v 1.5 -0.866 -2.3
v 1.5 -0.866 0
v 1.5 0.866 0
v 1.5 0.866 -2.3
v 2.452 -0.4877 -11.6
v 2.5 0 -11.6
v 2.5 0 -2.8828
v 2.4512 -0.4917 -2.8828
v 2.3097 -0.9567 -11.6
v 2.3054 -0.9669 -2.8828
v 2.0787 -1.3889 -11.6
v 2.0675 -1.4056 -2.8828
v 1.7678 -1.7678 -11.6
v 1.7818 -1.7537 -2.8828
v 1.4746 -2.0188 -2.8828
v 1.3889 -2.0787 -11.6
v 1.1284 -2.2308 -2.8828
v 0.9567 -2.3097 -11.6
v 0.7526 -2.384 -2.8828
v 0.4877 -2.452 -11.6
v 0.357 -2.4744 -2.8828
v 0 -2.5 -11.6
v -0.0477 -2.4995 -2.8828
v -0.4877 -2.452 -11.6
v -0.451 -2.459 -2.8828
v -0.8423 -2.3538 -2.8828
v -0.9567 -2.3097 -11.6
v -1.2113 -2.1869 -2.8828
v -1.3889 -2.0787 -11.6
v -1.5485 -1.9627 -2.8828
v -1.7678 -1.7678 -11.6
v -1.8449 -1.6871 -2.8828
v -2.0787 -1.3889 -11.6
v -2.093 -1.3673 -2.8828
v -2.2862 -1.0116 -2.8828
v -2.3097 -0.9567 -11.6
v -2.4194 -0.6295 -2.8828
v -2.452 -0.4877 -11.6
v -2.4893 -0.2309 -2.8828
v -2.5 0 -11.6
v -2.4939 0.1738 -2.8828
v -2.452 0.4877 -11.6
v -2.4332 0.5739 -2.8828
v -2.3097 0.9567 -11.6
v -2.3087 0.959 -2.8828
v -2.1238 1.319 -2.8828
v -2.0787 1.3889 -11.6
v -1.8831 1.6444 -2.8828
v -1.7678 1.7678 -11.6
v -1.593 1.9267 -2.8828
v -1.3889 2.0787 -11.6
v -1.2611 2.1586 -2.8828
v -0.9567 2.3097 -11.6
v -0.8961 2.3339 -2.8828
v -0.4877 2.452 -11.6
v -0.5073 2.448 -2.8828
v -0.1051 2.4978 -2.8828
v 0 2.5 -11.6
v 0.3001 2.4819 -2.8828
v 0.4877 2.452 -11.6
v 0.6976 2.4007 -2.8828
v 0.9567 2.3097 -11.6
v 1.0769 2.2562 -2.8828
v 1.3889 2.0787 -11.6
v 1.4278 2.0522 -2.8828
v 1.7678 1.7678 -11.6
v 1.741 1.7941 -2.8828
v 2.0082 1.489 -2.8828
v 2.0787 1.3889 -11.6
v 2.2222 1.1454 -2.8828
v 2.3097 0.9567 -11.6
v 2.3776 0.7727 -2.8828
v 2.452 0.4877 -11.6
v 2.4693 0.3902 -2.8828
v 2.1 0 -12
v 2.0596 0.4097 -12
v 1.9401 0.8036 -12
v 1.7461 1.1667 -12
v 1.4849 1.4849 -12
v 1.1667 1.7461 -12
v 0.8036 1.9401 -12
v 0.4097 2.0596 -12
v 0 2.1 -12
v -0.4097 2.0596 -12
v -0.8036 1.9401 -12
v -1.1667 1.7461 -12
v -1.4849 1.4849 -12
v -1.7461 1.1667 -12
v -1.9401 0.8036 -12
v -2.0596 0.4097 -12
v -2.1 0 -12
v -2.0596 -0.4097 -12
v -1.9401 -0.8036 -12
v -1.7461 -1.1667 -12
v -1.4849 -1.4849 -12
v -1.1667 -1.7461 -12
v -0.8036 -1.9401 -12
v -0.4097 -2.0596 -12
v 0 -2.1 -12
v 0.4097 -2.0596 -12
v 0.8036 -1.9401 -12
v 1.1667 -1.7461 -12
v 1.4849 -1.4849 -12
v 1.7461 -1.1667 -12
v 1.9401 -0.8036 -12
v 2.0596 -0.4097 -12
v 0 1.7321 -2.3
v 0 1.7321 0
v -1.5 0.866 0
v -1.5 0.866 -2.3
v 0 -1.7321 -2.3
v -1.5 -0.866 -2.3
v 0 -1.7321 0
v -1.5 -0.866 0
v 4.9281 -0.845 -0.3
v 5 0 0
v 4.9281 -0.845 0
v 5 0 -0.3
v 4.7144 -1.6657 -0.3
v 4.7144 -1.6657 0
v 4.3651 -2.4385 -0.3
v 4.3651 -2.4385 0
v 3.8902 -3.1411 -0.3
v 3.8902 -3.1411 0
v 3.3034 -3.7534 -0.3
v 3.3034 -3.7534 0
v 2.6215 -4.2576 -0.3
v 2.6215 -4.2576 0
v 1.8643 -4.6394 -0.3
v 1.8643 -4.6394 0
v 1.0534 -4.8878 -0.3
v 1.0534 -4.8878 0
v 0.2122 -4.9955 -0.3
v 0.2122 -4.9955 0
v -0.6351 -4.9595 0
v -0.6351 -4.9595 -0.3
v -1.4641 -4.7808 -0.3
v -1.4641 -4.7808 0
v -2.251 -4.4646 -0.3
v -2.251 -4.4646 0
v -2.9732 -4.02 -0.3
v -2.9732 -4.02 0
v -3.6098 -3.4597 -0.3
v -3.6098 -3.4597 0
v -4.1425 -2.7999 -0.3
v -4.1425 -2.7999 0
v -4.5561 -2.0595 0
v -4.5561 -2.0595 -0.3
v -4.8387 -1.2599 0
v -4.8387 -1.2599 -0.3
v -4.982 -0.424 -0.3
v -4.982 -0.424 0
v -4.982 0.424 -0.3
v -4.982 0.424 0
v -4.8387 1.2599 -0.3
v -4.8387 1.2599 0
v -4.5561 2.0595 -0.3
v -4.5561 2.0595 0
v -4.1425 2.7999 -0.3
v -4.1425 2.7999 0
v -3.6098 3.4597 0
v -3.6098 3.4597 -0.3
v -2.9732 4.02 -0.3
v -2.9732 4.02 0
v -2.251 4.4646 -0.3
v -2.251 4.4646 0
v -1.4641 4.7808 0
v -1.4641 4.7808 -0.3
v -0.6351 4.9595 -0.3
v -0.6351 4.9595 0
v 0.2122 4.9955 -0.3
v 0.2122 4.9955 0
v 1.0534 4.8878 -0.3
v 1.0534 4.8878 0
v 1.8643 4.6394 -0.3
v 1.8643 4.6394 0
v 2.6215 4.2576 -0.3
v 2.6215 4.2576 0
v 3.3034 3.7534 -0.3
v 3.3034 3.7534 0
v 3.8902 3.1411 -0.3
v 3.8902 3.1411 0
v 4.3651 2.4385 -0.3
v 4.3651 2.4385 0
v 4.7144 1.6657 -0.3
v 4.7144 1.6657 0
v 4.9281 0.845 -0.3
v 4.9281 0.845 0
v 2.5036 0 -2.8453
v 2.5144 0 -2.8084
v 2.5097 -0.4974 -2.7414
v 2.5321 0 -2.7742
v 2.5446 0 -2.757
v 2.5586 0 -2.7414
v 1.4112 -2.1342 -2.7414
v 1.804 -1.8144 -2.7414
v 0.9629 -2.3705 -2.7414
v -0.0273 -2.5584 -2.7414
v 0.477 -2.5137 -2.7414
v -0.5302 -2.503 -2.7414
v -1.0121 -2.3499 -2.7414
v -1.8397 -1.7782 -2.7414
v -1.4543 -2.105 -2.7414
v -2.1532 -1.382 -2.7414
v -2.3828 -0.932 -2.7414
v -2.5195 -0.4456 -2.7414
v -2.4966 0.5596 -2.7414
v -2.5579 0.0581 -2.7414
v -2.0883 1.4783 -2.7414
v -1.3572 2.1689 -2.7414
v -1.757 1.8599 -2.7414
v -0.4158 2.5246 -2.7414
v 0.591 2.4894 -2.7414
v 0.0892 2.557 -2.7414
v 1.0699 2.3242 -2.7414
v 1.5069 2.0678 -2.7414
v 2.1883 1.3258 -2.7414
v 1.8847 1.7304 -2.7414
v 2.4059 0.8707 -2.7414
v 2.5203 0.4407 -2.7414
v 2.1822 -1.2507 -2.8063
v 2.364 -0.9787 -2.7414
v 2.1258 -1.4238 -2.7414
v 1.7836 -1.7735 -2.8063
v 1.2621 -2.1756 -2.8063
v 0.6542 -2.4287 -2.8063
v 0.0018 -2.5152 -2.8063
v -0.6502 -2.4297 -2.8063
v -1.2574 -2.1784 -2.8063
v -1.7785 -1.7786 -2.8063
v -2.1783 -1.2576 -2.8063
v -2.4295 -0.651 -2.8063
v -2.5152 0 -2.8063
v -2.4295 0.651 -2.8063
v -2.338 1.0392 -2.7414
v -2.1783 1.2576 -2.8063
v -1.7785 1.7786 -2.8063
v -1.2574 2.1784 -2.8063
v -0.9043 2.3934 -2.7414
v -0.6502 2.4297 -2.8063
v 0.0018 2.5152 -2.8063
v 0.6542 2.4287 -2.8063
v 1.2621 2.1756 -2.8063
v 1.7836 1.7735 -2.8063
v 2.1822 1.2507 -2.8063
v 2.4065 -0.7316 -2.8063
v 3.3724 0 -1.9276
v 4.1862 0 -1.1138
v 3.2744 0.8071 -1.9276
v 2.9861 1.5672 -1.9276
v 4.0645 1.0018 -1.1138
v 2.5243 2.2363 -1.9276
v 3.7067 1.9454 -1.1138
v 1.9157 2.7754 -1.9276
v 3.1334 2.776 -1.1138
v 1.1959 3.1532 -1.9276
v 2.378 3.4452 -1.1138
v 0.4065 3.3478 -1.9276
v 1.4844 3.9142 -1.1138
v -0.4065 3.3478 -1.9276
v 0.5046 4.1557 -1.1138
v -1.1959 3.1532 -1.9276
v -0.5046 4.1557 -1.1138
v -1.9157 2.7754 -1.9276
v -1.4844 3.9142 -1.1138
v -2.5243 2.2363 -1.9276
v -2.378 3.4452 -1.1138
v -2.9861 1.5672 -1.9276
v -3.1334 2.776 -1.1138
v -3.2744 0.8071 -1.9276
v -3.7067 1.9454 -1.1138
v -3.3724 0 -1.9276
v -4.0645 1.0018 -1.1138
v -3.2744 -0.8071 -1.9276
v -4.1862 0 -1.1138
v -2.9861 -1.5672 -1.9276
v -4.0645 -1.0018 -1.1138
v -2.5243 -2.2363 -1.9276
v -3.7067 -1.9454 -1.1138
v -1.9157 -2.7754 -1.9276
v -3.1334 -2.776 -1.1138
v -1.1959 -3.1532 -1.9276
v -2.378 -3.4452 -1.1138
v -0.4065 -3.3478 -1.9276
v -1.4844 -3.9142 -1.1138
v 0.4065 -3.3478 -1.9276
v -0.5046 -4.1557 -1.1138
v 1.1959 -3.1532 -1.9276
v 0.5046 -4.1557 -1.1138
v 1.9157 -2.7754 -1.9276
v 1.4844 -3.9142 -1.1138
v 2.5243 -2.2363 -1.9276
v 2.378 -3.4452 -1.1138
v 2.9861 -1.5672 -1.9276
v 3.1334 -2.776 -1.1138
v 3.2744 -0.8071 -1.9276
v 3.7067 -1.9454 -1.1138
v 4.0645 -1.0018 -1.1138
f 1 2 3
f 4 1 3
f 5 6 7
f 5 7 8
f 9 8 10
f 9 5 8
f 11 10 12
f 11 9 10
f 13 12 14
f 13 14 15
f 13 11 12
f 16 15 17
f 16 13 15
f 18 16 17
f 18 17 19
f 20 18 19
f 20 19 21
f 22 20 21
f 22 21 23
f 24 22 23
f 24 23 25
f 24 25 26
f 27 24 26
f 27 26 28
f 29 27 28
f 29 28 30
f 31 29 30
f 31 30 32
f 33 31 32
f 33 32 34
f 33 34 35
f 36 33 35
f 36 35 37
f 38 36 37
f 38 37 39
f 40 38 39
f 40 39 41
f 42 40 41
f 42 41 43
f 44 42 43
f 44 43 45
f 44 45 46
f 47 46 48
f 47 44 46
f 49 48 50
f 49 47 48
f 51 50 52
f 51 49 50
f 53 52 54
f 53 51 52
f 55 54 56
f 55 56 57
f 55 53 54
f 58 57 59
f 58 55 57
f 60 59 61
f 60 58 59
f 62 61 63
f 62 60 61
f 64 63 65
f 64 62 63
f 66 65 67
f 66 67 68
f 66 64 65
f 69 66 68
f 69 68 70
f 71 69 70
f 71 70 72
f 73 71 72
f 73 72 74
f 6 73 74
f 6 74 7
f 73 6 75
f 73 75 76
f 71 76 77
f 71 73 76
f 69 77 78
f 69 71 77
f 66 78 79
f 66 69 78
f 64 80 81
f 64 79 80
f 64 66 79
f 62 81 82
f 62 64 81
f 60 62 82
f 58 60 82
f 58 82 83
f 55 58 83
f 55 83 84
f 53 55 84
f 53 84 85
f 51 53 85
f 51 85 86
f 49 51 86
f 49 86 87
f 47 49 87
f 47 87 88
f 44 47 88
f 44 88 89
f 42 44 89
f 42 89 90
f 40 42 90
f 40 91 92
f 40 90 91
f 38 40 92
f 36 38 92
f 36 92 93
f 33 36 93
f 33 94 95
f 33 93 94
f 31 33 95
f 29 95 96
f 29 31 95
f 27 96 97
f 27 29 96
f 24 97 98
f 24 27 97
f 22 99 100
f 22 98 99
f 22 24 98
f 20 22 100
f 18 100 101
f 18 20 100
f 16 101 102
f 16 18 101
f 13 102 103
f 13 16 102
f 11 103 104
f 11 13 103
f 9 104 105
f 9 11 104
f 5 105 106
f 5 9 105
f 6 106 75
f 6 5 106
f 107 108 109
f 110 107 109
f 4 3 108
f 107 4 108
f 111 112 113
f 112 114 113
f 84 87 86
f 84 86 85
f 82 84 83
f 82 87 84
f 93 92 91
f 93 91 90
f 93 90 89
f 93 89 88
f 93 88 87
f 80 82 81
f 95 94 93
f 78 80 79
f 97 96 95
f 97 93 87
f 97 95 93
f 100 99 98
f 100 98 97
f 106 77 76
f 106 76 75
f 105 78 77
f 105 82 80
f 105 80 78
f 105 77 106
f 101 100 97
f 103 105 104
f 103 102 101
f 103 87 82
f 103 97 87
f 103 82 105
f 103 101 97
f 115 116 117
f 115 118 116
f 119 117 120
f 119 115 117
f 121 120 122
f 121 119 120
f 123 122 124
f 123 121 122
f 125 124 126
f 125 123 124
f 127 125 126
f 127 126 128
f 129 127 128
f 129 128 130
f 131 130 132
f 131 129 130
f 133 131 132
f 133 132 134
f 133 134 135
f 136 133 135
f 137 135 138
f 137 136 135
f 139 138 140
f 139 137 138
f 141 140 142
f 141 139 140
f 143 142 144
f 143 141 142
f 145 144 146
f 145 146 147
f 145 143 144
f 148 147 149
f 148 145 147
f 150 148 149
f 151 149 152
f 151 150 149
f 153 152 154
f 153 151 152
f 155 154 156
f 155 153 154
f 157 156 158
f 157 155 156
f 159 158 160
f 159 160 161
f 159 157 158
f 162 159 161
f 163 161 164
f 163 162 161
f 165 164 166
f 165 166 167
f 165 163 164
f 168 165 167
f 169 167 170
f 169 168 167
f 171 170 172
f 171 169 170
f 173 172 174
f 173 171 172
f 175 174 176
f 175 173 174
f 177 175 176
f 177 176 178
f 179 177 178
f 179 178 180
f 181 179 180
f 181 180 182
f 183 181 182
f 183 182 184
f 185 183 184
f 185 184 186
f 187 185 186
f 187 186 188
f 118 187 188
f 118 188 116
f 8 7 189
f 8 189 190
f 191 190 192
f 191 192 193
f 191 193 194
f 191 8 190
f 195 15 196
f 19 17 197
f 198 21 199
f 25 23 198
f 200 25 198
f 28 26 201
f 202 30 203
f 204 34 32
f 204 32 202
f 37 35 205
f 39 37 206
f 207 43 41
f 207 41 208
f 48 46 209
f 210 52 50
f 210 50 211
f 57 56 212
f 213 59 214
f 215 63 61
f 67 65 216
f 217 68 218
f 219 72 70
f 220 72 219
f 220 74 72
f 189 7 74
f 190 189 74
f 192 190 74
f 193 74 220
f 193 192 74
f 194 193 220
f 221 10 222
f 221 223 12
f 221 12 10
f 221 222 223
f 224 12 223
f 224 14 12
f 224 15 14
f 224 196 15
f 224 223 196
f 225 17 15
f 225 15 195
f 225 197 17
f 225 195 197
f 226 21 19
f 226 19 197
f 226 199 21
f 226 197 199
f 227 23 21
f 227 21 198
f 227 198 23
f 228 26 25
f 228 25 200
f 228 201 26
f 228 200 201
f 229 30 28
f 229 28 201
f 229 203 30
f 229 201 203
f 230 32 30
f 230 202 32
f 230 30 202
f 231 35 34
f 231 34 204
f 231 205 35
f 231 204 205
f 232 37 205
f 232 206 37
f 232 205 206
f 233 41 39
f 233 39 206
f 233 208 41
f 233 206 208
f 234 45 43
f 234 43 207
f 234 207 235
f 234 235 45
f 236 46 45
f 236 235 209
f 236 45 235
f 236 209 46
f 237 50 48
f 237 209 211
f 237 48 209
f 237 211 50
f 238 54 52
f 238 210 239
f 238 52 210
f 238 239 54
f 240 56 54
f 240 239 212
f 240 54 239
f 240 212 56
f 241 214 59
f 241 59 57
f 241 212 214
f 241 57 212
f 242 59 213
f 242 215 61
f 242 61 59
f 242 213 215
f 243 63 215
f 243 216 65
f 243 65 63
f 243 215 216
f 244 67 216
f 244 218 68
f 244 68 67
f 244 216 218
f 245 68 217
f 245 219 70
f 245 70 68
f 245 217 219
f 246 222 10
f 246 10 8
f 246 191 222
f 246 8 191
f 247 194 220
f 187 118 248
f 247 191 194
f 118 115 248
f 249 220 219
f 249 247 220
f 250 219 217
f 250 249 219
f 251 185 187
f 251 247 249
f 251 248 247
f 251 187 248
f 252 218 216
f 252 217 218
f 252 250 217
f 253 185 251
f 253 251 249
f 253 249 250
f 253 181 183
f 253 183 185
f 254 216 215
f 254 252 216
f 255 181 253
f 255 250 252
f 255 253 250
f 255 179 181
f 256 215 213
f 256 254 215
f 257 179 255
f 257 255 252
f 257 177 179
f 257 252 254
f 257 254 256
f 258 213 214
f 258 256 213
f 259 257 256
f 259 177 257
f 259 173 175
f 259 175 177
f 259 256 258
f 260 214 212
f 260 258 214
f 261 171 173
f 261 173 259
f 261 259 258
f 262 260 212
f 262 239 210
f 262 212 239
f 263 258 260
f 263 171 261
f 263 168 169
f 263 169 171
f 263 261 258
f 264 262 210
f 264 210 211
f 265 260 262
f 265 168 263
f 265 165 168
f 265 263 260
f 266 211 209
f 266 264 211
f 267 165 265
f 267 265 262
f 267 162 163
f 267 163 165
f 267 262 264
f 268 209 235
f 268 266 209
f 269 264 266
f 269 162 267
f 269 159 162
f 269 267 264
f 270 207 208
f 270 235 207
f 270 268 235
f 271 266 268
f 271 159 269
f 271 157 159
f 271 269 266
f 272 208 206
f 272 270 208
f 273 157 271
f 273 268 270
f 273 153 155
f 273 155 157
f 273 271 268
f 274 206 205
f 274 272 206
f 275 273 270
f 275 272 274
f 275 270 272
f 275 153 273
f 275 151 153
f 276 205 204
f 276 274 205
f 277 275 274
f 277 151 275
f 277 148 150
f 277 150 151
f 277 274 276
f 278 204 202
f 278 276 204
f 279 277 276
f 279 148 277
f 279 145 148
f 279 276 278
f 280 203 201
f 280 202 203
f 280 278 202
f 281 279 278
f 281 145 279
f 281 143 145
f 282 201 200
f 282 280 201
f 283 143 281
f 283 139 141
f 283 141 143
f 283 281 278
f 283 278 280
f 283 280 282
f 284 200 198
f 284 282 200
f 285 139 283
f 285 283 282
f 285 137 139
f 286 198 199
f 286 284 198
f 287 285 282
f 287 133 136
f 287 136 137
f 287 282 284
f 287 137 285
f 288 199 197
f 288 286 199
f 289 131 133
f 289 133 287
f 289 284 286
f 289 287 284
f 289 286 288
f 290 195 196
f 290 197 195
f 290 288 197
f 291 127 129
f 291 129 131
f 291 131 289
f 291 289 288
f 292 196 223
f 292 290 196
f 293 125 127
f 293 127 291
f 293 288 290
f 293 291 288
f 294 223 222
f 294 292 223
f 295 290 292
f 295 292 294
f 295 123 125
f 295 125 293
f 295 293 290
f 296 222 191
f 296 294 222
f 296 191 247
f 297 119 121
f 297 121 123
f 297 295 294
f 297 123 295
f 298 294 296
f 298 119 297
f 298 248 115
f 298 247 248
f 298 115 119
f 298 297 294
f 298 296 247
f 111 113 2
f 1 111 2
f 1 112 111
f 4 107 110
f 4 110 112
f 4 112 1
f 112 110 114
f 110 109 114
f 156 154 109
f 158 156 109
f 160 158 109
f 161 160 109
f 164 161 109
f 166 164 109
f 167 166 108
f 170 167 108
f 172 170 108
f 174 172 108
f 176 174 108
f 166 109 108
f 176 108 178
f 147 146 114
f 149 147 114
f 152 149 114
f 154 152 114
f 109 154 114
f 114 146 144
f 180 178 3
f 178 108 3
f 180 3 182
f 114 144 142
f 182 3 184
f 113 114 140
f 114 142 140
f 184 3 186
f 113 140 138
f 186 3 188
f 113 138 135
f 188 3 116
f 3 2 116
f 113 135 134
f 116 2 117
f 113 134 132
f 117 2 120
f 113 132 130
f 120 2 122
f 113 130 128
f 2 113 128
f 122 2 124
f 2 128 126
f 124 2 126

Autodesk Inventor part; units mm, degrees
ref_plane "YZ Plane" through (0, 0, 0) normal (1, 0, 0) x (0, 1, 0)
sketch "Sketch1" plane through (0, 0, 0) normal (0, 1, 0) x (-1, 0, 0)
  point P0 (0, 0)
sketch "Sketch2" plane through (0, 0, 0) normal (0, 1, 0) x (-1, 0, 0)
  line L0 (-2.5, -12) -> (0, -12)
  line L1 (-2.5, -2.8) -> (-2.5, -12)
  line L2 (-5, -0.3) -> (-2.5, -2.8)
  line L3 (-5, 0) -> (-5, -0.3)
  line L4 (0, 0) -> (-5, 0)
  line L5 (0, -12) -> (0, 0)
  line L6 (0, -12) -> (0, 0)
  line L7 (0, -14.4) -> (0, 2.4) projected
  line L8 (1, 0) -> (-6, 0) projected
  dimension "d3" = 5
  dimension "d5" = 2.5
  dimension "d7" = 12
  dimension "ParC" = 0.3
  dimension "d22" = 0
  dimension "d23" = 0
  dimension "d43" = 45
revolve "Revolution1" add sketch "Sketch2" angle 360 about axis through (0, 0, -12) along (0, 0, -1)
sketch "Sketch3" plane through (0, 0, 0) normal (0, 0, 1) x (1, 0, 0)
  line L0 (-1.5, 0.866) -> (-1.5, -0.866)
  line L1 (0, 1.7321) -> (-1.5, 0.866)
  line L2 (1.5, 0.866) -> (0, 1.7321)
  line L3 (1.5, -0.866) -> (1.5, 0.866)
  line L4 (0, -1.7321) -> (1.5, -0.866)
  line L5 (-1.5, -0.866) -> (0, -1.7321)
  circle A0 centre (0, 0) radius 1.5 construction
  circle A1 centre (0, 0) radius 2.5 construction
  dimension "d11" = 3
  dimension "d13" = 120
  dimension "d15" = 120
extrude "Extrusion1" cut sketch "Sketch3" against normal blind 2.3
fillet "Fillet1" radius 0.2 1 edges at (-2.5, 0, -2.8)
chamfer "Chamfer1" distance 0.4 angle 45 1 edges at (-2.5, 0, -12) measured on face at (-0.599, -2.4272, -8.9609)
thread "Thread1" size "M5x0.8" class "6g" standard "ISO Metric profile" length 7.6
ref_plane "MSC_PF1" through (0, 0, 0) normal (1, 0, 0) x (0, 1, 0)
ref_plane "MSC_PT1" through (0, 0, 0) normal (0, 0, -1) x (-1, 0, 0)
equation "\"d3\" = 0.5 * dk"
equation "\"d5\" = 0.5 * NND"
equation "\"d7\" = NLG"
equation "\"d43\" = 0.5 * ang"
equation "\"d18\" = r"
equation "\"d19\" = 0.5 * PTC"
equation "\"d39\" = 0.5 * PTC"
equation "\"d11\" = ParS"
equation "\"d16\" = ParT"
equation "\"NND\" = 5"
equation "\"PTC\" = 0.8"
equation "\"ParK\" = 2.8"
equation "\"ParS\" = 3"
equation "\"ParT\" = 2.3"
equation "\"r\" = 0.2"
equation "\"NLG\" = 12"
equation "\"ang\" = 90deg"
equation "\"THREADDIA\" = NND"
equation "\"dk\" = 10"
properties part number "ISO 10642 - M5x12" material "Steel, Mild"
